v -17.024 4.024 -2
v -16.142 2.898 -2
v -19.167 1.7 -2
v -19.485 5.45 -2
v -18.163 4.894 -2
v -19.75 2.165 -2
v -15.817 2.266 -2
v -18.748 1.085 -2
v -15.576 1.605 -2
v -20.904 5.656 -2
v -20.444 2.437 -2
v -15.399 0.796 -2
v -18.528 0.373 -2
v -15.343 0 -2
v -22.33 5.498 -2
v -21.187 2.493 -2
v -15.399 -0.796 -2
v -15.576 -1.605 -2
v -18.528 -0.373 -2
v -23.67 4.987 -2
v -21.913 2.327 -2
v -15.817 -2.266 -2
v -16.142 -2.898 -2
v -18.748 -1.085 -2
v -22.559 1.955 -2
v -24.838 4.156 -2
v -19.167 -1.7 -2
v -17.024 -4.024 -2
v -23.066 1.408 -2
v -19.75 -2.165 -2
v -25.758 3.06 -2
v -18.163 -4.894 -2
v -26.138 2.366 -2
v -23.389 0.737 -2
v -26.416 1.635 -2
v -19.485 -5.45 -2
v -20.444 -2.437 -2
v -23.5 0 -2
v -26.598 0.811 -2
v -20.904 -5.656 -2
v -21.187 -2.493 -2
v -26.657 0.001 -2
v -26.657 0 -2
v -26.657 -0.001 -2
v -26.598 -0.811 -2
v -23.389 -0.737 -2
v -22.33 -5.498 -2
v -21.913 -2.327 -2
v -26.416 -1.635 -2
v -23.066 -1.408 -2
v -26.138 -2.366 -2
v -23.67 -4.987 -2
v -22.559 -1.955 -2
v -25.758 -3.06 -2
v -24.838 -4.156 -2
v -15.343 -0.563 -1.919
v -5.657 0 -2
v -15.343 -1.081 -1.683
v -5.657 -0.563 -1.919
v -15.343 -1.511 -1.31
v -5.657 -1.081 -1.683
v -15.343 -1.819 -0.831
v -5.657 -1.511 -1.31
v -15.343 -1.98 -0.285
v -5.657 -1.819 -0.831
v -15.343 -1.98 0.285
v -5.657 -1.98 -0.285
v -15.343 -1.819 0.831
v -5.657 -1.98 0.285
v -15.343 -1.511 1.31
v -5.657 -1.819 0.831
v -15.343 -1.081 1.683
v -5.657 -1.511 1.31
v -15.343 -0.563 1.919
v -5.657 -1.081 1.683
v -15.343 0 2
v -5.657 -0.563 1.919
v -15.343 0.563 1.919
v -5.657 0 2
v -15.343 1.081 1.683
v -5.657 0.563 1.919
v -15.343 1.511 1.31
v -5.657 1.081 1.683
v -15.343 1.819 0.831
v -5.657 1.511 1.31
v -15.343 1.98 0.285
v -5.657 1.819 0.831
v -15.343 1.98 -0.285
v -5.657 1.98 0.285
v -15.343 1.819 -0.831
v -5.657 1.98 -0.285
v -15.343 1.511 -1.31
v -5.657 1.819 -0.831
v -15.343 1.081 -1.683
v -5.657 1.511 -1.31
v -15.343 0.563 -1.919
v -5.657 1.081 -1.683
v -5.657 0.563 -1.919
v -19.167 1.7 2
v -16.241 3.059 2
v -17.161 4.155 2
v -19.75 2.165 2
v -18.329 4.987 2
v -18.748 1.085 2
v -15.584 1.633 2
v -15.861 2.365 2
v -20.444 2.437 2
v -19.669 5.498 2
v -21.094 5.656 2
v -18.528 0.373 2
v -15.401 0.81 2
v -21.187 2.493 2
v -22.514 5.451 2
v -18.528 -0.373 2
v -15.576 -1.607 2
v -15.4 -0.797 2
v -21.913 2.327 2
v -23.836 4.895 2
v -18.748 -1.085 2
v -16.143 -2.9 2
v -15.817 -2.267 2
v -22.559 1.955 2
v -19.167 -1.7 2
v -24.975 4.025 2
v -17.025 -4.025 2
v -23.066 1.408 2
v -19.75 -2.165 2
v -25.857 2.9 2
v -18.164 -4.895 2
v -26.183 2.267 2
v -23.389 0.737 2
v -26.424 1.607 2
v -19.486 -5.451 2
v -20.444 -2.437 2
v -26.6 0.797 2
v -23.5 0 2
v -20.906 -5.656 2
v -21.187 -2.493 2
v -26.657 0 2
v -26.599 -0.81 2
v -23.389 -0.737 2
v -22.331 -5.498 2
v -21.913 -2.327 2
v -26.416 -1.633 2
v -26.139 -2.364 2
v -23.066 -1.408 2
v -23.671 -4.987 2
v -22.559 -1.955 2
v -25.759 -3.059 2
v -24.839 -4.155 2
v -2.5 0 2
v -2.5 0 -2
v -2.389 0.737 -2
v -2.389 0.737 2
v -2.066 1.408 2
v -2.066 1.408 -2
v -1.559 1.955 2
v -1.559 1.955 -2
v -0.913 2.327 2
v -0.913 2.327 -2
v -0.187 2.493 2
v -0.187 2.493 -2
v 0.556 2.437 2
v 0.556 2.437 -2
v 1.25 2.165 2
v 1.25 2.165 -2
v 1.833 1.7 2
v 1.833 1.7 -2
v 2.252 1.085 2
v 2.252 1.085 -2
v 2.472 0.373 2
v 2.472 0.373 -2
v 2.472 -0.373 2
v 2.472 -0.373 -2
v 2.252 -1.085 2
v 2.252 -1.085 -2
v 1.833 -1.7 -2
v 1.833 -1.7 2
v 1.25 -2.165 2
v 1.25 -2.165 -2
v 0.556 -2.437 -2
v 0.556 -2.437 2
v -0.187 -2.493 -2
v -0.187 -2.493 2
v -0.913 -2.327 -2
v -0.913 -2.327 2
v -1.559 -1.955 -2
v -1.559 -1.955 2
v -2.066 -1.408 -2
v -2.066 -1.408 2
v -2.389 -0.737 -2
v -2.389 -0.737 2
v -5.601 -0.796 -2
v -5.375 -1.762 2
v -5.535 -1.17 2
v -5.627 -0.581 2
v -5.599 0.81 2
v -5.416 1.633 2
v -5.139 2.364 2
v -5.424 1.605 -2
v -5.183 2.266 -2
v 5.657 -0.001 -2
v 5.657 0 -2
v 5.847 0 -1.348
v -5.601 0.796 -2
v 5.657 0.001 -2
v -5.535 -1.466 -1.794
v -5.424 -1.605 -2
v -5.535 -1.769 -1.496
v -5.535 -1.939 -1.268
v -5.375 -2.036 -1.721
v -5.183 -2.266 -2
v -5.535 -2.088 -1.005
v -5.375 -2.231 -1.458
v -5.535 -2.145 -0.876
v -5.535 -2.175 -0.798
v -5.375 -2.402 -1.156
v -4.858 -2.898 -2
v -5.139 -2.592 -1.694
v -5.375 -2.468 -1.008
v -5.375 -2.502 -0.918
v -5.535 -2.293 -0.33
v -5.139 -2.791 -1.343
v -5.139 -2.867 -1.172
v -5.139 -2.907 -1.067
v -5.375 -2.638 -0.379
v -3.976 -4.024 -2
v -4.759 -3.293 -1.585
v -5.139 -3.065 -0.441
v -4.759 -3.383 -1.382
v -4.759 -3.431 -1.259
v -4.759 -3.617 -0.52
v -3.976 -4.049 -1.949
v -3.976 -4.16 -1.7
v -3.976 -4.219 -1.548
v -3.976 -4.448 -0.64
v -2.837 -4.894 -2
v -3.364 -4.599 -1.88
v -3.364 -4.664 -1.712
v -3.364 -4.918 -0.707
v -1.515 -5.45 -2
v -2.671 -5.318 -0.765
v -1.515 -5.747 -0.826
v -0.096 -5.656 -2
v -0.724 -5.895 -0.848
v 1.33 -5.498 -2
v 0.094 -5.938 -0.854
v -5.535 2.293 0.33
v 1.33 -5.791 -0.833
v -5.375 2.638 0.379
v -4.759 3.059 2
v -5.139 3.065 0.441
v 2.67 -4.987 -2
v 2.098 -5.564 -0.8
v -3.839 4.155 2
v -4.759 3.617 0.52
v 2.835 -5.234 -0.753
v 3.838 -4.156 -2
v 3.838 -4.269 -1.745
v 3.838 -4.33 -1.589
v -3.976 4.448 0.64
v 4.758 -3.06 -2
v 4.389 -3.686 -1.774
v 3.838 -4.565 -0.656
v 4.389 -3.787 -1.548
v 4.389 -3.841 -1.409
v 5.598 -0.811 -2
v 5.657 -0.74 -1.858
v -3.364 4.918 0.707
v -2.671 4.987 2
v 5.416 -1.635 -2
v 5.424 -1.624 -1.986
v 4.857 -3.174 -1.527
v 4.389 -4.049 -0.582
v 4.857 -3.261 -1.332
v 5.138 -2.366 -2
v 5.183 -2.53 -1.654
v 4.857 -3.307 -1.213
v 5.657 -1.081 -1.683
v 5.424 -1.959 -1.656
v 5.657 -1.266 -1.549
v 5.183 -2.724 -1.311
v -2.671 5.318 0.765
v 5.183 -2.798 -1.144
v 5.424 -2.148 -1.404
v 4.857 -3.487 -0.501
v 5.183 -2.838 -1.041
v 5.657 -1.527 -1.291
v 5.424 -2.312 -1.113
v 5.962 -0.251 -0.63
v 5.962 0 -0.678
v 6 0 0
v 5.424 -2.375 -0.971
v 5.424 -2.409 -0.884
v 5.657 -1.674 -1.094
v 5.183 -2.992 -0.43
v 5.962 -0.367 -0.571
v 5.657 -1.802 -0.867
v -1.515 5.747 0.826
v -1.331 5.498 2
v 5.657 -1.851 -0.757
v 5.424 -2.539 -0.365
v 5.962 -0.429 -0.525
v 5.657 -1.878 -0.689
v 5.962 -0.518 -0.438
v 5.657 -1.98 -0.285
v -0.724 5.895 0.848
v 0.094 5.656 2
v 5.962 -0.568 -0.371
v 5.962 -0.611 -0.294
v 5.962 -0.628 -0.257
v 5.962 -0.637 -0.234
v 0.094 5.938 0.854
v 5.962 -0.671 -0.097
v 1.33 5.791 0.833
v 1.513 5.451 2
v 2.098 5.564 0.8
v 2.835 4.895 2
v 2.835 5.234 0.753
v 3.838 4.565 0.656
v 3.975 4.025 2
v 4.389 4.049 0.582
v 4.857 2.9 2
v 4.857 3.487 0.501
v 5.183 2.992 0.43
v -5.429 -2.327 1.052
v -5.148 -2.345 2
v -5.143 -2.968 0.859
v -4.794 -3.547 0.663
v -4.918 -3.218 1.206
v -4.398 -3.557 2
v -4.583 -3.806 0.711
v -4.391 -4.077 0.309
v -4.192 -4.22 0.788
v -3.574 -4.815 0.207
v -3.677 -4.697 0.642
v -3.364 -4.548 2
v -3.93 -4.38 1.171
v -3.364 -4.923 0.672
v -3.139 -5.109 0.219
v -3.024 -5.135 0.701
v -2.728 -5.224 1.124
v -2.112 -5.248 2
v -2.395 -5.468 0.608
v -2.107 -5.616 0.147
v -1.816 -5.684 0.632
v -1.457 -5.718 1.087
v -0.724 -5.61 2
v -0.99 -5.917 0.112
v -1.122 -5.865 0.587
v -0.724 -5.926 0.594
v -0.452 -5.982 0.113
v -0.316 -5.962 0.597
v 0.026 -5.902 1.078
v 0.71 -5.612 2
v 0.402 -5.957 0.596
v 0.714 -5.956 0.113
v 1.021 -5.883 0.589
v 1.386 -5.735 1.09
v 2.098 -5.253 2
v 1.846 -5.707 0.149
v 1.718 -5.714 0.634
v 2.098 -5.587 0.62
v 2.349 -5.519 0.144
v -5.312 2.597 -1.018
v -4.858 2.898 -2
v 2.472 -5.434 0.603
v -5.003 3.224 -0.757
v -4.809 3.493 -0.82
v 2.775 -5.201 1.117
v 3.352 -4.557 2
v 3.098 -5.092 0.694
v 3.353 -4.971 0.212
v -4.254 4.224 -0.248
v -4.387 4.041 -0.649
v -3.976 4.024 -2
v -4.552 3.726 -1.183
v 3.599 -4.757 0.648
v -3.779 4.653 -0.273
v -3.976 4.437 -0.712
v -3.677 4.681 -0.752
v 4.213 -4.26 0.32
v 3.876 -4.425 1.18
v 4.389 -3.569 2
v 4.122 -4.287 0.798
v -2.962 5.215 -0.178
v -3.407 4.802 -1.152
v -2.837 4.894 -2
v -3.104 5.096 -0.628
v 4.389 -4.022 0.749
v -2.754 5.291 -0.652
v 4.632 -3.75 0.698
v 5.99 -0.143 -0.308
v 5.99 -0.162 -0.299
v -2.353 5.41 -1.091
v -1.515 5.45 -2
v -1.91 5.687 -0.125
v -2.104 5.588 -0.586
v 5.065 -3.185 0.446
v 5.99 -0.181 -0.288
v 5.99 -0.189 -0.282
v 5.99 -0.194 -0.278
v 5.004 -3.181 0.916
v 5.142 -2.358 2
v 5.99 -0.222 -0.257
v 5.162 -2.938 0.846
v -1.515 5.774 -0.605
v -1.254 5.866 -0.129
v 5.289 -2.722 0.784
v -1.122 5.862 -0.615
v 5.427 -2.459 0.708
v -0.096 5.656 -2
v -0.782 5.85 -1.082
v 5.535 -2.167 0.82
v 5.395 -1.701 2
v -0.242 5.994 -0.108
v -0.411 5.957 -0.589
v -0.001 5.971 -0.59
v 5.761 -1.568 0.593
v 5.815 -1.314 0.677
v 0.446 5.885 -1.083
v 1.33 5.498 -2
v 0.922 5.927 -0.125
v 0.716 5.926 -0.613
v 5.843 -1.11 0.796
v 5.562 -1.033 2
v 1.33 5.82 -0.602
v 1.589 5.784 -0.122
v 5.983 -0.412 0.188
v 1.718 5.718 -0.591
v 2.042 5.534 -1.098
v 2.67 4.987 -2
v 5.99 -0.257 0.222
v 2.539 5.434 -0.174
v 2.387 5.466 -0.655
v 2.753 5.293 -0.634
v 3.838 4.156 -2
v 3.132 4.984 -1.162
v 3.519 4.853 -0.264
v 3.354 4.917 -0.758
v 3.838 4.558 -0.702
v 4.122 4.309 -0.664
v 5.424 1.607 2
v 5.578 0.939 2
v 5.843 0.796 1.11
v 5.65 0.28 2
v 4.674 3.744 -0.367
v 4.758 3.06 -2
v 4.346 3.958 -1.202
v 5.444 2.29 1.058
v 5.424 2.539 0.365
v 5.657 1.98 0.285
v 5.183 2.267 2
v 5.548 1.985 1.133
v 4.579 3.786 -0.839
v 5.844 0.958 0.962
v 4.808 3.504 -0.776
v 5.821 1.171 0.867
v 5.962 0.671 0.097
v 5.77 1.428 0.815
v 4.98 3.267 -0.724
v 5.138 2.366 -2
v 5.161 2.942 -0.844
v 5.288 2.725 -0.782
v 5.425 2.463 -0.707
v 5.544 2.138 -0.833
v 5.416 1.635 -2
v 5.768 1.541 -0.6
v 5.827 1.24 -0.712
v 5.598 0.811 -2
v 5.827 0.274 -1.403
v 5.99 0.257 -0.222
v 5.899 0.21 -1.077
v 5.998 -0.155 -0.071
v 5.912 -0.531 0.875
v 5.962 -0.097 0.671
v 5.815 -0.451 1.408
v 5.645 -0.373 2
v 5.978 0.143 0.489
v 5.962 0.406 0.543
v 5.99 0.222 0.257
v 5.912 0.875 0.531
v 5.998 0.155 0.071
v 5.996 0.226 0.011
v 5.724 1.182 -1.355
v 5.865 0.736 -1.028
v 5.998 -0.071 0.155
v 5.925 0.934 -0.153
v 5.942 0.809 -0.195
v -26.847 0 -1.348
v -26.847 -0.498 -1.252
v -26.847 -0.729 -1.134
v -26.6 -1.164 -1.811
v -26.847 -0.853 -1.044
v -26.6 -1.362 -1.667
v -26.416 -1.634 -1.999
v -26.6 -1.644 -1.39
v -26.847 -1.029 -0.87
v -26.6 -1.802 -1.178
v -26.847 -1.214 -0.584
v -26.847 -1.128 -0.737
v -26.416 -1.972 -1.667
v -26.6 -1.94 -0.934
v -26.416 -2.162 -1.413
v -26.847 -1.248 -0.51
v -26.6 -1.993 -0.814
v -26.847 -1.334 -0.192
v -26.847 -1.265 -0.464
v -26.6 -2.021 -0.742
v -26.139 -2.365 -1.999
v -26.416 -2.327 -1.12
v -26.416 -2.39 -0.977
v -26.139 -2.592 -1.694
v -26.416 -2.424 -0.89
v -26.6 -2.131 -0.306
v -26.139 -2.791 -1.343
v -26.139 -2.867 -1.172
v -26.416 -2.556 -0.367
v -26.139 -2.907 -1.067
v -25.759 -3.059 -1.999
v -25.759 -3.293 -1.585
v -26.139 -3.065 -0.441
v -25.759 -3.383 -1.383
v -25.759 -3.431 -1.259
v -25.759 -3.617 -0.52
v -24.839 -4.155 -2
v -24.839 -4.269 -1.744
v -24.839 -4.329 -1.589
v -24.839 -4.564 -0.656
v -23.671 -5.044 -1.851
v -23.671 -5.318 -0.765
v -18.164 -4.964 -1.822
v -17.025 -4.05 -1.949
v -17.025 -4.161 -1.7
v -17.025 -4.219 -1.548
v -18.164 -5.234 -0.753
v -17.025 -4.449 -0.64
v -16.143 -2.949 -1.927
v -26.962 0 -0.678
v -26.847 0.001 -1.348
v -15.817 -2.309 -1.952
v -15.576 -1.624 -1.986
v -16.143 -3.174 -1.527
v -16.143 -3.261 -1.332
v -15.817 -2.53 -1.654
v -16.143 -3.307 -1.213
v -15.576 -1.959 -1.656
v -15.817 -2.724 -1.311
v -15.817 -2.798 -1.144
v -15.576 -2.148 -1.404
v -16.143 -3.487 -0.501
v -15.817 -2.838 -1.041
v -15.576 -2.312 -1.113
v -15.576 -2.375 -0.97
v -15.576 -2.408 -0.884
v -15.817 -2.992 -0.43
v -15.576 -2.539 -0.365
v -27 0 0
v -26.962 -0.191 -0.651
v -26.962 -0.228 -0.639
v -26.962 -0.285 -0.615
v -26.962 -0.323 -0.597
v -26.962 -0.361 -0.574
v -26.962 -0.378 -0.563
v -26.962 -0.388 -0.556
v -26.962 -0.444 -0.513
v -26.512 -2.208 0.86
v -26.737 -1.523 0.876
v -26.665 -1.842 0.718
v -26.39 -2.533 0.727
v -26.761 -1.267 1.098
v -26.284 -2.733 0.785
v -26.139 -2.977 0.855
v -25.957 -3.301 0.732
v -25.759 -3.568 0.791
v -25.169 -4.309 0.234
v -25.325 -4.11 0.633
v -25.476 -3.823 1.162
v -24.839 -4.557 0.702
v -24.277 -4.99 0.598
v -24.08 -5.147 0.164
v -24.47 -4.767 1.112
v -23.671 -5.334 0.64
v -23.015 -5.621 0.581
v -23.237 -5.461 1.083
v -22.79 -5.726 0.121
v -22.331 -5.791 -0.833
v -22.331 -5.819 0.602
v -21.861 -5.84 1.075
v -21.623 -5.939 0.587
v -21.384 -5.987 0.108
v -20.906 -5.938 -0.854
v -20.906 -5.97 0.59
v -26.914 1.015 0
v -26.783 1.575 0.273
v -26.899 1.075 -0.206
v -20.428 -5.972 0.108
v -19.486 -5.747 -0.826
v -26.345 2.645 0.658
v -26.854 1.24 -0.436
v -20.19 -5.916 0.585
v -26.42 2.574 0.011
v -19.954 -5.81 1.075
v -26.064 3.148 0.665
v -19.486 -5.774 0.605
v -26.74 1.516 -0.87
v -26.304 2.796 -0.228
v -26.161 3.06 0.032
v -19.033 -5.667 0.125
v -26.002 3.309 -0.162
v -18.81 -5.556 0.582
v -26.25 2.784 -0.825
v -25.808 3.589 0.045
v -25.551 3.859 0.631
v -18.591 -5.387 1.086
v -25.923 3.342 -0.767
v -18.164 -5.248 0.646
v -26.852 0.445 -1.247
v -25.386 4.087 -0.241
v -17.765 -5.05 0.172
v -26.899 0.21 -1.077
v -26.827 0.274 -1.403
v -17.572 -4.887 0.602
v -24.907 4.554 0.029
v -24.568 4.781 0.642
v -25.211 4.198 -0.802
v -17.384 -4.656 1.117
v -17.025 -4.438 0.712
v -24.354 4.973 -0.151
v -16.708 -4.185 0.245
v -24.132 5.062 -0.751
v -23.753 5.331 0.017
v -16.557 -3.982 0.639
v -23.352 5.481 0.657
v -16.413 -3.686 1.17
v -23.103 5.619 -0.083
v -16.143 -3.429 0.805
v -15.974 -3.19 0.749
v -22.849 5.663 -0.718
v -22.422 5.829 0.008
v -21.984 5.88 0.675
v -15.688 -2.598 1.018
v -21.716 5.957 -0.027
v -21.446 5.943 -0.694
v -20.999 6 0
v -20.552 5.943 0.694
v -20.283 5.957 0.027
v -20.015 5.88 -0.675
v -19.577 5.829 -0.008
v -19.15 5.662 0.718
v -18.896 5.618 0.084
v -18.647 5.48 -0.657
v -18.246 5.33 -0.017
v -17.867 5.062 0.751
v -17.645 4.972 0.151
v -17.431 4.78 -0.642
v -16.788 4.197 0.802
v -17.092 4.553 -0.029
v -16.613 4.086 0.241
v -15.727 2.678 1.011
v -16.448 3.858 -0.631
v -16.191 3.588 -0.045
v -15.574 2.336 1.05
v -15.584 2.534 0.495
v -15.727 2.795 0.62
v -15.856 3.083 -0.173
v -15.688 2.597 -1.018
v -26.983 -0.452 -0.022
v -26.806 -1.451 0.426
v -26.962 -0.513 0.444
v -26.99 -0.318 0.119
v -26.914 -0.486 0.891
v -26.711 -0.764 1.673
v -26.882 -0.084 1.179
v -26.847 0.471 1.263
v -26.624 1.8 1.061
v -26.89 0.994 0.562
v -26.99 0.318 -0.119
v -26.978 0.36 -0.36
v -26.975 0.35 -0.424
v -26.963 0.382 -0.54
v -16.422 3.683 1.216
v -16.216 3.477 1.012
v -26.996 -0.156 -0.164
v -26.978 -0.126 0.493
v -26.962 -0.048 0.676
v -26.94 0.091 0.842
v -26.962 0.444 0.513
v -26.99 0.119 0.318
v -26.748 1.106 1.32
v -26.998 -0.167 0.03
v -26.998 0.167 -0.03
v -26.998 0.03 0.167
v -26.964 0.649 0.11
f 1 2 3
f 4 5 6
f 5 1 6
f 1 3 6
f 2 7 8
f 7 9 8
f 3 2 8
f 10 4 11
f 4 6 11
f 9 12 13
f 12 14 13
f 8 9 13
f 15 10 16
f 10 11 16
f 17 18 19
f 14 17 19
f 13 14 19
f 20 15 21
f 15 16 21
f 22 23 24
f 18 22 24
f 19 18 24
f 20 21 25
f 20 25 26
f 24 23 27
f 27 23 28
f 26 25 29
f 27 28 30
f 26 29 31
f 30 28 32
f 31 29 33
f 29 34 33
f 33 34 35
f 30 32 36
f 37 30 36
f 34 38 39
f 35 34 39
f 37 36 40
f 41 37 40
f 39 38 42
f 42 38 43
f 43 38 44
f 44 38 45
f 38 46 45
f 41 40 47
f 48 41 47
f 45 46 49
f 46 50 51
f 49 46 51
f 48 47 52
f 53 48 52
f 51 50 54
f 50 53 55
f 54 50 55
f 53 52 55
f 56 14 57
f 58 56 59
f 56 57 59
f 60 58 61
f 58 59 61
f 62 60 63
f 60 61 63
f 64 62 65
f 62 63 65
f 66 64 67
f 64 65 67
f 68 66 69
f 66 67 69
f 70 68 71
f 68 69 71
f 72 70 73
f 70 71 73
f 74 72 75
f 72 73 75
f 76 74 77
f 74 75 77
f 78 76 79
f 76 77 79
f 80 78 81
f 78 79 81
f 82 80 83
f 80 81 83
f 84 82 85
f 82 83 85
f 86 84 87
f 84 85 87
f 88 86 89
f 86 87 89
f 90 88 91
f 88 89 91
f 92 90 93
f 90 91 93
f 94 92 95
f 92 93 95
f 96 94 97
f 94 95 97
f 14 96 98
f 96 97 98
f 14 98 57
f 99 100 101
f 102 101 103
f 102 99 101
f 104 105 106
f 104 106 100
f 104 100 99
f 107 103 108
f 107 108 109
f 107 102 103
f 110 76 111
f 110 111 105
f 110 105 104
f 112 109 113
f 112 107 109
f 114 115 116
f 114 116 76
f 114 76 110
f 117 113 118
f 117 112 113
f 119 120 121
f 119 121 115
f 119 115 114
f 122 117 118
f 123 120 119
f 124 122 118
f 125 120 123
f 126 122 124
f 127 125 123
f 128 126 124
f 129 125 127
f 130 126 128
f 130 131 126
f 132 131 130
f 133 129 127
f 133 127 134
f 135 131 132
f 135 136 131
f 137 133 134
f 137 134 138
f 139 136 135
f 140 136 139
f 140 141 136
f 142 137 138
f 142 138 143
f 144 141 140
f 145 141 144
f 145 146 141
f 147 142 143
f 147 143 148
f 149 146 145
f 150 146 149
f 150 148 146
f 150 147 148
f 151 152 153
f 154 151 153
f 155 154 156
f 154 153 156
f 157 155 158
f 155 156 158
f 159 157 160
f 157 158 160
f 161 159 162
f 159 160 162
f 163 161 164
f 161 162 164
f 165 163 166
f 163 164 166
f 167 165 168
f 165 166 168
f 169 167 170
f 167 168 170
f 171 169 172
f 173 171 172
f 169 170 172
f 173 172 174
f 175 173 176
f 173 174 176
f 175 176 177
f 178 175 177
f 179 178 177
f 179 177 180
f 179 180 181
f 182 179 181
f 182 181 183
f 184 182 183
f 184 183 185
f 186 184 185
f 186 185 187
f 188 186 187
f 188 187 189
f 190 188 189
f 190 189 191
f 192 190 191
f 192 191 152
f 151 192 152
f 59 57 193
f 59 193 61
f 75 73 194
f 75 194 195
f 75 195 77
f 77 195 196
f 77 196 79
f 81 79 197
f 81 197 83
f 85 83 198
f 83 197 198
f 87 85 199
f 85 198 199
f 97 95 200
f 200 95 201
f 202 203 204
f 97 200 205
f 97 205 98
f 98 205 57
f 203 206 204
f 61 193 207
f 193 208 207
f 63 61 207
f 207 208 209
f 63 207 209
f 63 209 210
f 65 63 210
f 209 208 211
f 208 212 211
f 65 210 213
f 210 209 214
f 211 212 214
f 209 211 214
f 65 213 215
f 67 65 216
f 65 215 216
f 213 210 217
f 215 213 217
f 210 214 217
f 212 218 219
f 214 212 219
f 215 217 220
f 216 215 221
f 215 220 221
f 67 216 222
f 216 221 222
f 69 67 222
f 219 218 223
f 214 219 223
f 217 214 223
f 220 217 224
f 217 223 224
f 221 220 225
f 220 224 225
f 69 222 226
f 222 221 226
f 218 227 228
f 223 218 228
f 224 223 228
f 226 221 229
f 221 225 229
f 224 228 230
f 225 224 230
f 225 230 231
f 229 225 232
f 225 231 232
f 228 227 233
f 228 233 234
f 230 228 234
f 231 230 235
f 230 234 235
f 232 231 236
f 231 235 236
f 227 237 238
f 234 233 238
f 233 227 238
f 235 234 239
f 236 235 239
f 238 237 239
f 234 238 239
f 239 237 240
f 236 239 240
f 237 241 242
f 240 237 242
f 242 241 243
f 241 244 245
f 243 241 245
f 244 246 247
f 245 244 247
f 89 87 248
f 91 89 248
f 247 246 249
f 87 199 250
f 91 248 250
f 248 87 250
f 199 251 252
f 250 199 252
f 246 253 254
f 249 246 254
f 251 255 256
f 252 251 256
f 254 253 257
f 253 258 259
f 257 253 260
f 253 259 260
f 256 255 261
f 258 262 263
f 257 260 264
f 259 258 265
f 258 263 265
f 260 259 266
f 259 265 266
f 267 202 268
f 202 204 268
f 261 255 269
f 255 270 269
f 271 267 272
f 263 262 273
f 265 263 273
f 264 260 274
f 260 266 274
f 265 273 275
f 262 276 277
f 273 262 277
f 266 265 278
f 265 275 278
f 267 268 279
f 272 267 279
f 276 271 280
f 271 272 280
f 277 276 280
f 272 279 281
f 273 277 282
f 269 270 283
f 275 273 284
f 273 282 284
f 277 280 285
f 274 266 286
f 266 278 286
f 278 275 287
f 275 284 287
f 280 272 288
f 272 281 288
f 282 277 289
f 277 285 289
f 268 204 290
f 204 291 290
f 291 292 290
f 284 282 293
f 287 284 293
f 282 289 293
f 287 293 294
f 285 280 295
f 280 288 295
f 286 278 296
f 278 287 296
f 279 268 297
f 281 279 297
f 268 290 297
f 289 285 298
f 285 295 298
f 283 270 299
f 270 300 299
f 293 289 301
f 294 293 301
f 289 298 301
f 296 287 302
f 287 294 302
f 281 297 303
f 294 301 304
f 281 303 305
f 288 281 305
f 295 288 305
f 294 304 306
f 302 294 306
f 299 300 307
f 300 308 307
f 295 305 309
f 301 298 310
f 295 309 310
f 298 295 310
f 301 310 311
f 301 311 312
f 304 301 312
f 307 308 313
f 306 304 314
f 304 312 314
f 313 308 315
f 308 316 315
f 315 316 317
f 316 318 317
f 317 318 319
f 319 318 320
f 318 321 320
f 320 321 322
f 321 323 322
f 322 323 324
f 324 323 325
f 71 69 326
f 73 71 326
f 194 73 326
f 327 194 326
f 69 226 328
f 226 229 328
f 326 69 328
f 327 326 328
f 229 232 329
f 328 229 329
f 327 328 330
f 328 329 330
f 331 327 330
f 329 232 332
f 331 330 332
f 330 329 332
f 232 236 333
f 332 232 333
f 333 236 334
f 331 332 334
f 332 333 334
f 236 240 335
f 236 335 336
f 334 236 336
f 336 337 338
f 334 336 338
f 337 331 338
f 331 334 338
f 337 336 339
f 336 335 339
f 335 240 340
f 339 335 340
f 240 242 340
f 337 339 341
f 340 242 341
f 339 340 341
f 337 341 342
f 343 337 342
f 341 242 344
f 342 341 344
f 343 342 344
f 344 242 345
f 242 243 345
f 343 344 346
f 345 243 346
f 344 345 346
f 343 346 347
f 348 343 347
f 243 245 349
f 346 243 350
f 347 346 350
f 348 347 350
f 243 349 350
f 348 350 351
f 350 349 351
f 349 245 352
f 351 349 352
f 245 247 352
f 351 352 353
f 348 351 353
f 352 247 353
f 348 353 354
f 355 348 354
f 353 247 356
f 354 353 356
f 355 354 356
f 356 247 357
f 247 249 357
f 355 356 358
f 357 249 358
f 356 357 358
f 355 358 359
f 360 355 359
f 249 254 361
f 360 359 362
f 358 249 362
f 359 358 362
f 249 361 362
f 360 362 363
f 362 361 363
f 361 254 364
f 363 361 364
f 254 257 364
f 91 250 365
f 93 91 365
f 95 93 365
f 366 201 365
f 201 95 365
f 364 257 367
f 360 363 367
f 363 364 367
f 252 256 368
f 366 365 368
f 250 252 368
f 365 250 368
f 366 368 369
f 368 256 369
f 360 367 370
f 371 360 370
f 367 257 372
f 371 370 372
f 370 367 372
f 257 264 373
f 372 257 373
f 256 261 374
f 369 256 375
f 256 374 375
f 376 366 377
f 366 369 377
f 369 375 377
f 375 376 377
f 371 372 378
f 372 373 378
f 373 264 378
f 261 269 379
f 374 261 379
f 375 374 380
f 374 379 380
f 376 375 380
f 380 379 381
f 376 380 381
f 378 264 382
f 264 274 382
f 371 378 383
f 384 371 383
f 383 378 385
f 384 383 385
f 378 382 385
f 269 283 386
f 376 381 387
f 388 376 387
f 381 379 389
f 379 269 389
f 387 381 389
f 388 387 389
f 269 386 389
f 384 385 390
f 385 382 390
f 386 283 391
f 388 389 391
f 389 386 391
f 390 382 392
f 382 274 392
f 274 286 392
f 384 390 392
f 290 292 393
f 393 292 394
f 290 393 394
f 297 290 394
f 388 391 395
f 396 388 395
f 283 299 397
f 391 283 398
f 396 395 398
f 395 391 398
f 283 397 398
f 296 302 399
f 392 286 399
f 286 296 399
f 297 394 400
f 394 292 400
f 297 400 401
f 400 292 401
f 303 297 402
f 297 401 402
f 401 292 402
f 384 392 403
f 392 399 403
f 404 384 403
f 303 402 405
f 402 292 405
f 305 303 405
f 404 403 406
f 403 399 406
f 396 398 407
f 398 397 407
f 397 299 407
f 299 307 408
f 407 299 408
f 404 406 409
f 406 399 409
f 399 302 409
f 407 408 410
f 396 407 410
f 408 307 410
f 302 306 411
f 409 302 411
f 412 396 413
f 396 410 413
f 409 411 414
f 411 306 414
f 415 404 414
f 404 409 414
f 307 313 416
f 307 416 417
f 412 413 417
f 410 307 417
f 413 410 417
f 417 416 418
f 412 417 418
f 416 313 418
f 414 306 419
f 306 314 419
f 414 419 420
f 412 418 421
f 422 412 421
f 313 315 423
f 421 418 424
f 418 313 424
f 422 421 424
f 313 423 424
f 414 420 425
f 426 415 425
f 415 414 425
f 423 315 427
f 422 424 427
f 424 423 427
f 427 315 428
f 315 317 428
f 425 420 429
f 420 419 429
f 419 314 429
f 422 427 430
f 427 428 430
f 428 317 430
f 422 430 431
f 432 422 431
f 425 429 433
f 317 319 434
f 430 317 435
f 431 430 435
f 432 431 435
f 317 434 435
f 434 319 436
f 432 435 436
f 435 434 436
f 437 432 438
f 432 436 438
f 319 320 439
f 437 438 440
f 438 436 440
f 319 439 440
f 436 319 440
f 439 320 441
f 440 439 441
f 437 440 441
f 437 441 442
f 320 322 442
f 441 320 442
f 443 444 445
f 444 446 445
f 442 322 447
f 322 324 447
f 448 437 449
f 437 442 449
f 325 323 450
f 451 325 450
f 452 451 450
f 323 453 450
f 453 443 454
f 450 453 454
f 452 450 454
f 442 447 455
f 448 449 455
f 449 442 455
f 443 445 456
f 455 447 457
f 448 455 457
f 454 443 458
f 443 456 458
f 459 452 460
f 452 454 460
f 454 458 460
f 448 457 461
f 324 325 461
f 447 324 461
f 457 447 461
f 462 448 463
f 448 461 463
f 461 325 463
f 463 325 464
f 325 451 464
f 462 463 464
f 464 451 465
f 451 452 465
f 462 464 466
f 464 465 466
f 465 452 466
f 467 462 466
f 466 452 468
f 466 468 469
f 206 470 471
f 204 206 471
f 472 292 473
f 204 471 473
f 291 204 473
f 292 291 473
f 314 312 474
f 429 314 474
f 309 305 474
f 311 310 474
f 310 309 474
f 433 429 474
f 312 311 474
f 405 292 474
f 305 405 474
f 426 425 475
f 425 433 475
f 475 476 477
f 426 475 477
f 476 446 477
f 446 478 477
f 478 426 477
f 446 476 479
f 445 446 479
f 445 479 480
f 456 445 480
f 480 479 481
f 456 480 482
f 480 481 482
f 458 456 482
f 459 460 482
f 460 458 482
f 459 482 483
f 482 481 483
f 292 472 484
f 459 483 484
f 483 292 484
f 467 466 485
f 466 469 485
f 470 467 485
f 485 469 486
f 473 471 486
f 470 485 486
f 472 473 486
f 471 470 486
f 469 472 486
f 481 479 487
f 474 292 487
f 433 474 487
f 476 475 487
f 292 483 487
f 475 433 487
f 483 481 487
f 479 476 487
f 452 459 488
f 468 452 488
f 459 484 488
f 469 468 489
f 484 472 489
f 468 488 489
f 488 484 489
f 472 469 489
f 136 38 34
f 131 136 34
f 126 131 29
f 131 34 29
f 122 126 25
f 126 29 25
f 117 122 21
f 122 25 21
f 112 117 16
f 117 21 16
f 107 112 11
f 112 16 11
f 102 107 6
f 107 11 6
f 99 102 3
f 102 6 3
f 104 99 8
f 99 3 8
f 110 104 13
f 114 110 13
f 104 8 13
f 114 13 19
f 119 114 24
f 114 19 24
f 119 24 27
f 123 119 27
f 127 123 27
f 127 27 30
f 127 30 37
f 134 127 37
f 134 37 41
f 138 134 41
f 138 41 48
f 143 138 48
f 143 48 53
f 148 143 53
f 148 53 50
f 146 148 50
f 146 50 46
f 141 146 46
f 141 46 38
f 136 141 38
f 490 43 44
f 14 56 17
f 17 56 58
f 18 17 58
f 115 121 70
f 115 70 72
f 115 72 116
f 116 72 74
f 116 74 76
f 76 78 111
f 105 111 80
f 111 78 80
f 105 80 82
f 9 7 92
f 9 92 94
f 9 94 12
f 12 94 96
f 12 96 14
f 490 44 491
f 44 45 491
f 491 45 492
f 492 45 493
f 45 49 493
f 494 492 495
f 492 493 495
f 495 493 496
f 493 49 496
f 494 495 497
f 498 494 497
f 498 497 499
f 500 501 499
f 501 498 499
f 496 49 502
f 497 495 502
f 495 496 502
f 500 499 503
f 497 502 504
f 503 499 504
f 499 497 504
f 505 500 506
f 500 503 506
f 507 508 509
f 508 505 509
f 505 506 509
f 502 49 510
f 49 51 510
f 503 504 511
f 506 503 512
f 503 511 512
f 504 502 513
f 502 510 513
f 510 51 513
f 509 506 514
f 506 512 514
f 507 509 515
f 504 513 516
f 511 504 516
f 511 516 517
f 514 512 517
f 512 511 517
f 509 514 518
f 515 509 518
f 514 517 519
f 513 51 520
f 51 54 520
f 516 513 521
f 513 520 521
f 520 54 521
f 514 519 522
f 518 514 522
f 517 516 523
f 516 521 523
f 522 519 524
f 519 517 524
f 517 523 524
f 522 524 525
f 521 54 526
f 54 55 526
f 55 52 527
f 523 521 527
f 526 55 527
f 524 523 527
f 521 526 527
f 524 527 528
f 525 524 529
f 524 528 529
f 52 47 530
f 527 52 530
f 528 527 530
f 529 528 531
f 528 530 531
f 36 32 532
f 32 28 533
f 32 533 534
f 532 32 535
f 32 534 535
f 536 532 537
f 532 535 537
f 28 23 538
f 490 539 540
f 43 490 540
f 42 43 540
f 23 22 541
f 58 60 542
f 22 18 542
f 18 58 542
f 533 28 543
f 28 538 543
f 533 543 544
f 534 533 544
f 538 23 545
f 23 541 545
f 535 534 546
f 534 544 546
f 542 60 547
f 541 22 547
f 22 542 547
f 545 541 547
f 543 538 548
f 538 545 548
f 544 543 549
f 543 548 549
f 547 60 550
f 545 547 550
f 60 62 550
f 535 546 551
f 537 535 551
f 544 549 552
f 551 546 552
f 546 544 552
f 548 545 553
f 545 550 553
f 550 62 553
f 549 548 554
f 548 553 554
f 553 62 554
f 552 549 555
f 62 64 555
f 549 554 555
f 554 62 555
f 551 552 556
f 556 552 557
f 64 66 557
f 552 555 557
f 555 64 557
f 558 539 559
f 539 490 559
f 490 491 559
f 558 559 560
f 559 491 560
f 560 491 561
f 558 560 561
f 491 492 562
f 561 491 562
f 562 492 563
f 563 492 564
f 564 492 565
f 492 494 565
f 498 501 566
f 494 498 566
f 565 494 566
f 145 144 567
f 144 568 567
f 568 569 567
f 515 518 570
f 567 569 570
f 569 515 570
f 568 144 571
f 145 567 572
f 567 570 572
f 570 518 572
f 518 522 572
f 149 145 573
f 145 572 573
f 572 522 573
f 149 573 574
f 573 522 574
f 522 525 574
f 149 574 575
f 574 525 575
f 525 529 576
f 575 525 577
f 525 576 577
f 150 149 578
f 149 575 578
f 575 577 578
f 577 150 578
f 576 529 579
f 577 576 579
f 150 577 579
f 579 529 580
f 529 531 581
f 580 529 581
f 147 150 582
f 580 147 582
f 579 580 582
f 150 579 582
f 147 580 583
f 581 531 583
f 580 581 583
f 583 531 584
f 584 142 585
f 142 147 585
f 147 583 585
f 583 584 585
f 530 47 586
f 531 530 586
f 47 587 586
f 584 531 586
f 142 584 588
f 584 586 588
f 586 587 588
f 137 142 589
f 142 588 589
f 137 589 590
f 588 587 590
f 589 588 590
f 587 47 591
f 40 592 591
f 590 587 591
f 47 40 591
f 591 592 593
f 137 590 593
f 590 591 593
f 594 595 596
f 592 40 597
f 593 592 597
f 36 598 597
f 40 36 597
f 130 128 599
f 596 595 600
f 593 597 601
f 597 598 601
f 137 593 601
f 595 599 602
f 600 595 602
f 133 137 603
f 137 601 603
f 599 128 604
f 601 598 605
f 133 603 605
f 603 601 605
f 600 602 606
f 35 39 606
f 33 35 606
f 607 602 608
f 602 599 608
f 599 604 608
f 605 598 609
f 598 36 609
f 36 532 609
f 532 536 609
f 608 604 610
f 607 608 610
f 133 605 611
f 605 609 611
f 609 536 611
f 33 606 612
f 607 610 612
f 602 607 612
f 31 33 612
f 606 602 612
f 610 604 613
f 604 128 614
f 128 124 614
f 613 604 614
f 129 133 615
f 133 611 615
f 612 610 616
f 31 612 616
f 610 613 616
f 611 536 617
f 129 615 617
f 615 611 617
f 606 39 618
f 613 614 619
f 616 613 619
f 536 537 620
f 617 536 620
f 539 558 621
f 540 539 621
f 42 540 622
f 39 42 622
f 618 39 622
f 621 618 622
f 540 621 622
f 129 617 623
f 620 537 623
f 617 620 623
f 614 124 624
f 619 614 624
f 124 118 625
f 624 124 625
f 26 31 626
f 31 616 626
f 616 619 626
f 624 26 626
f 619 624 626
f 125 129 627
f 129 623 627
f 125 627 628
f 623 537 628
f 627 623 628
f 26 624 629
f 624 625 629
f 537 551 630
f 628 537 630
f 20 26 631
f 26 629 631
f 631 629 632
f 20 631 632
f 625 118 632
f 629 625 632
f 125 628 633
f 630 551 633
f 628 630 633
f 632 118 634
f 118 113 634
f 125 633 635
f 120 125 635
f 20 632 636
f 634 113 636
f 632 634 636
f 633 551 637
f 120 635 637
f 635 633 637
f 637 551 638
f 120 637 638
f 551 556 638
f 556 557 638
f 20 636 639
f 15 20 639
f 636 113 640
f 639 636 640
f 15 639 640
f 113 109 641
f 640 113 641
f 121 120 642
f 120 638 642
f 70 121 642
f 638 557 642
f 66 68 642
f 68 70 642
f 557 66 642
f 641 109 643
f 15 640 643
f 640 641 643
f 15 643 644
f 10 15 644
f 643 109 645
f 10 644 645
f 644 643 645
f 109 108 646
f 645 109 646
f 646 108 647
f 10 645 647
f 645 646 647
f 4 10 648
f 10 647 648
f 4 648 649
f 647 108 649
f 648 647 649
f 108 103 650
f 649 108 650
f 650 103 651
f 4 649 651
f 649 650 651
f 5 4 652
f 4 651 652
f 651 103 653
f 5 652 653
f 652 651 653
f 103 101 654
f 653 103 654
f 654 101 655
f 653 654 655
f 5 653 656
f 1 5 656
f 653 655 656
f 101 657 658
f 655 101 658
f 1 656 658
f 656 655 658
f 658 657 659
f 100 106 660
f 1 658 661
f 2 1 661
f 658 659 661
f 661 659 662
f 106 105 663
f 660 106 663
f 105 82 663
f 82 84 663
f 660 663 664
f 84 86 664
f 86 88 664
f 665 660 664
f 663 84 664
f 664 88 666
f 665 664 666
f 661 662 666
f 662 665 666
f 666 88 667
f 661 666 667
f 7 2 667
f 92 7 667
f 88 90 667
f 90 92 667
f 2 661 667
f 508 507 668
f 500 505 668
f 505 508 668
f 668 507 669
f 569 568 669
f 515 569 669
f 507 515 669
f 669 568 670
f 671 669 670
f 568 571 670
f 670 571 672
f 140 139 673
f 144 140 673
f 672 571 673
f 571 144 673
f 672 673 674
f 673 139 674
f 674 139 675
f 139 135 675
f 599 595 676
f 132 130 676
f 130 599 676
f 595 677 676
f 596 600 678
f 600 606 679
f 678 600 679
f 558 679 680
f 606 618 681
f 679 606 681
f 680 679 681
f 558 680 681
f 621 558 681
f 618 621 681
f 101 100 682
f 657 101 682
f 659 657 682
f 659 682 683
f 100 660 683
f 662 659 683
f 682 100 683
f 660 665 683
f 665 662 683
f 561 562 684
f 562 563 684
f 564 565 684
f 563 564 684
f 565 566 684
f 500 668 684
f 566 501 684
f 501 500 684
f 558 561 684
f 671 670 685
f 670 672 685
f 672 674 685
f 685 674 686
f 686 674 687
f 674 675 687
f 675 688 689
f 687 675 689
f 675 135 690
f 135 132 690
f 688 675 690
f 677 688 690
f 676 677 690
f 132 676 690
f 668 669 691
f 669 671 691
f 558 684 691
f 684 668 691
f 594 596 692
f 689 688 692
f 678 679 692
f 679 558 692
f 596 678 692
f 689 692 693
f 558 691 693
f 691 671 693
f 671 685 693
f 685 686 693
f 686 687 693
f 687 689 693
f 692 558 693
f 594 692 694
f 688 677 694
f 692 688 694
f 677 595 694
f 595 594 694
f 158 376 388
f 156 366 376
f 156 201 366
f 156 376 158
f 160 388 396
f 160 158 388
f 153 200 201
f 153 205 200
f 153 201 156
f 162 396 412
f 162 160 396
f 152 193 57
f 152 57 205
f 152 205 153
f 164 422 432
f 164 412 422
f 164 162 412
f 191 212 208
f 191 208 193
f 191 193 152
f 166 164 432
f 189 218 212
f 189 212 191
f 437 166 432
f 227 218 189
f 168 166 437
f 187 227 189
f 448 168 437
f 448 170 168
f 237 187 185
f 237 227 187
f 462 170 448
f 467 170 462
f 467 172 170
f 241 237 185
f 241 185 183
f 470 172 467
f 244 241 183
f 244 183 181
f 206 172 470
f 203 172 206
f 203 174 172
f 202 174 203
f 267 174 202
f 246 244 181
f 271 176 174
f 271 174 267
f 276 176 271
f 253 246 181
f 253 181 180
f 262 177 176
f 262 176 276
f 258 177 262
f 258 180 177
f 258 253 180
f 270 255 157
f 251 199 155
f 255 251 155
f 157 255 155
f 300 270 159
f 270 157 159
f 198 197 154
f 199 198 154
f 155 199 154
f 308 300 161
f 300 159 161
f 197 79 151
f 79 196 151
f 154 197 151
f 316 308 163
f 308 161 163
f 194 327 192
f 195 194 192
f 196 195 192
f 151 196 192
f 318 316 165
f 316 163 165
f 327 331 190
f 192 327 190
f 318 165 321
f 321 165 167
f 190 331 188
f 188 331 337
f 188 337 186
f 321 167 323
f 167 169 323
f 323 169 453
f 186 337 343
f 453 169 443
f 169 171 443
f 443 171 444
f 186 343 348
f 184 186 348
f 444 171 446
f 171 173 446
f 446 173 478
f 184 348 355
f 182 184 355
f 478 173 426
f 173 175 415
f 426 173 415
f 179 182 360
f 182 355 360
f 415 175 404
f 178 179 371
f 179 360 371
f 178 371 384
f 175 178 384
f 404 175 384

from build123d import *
from build123d.topology import SkipClean

# Parameters (mm, degrees)
CUT_EXTRUDE4_DEPTH       = 29.301943396
CUT_EXTRUDE4_DEPTH_BACK  = 29.301943396
CUT_EXTRUDE5_REACH       = 30.792
SKETCH5_R                = 2.5
CUT_EXTRUDE10_DEPTH      = 10
CUT_EXTRUDE10_DEPTH_BACK = 10
SKETCH9_R                = 2.5
CUT_EXTRUDE11_DEPTH      = 10


with BuildPart() as part:
    # Sketch1 → Revolve1 (revolve)
    with BuildSketch(Plane.XY):
        with BuildLine():
            Line((6, 0), (-27, 0))
            ThreePointArc((-27, 0), (-22.014611872, 5.913591358), (-15.343145751, 2))
            Line((-15.343145751, 2), (-5.656854249, 2))
            ThreePointArc((-5.656854249, 2), (1.014611872, 5.913591358), (6, 0))
        make_face()
    revolve(axis=Axis((6.214656997, 0, 0), (-1, 0, 0)))

    # Sketch4 → Cut-Extrude4 (cut, two sides: drawn at the far end of the back side and taken through both)
    with SkipClean():  # the faces are left unmerged after this step: merging them gives an invalid solid
        with BuildSketch(Plane(origin=(0, 0, 0), x_dir=(1, 0, 0), z_dir=(0, 1, 0)).offset(-CUT_EXTRUDE4_DEPTH_BACK)):
            with BuildLine():
                Line((-5.656854249, 2), (5.656854249, 2))
                ThreePointArc((5.656854249, 2), (0, 6), (-5.656854249, 2))
            make_face()
            with BuildLine():
                Line((-5.656854249, -2), (5.656854249, -2))
                ThreePointArc((5.656854249, -2), (0, -6), (-5.656854249, -2))
            make_face()
        extrude(amount=CUT_EXTRUDE4_DEPTH + CUT_EXTRUDE4_DEPTH_BACK, mode=Mode.SUBTRACT)

    # Sketch5 → Cut-Extrude5 (cut, up to next)
    with BuildSketch(Plane(origin=(0, 0, -2), x_dir=(-1, 0, 0), z_dir=(0, 0, -1)), mode=Mode.PRIVATE) as cut_extrude5_sk1:
        Circle(SKETCH5_R)
    cut_extrude5_tool1 = extrude(cut_extrude5_sk1.sketch, amount=-CUT_EXTRUDE5_REACH, mode=Mode.PRIVATE) & part.part
    add(cut_extrude5_tool1.solids().sort_by_distance((0, 0, -2))[0], mode=Mode.SUBTRACT)

    # Sketch8 → Cut-Extrude10 (cut, two sides: drawn at the far end of the back side and taken through both)
    with SkipClean():  # the faces are left unmerged after this step: merging them gives an invalid solid
        with BuildSketch(Plane(origin=(0, 0, 0), x_dir=(1, 0, 0), z_dir=(0, 1, 0)).offset(-CUT_EXTRUDE10_DEPTH_BACK)):
            with BuildLine():
                Line((-15.343145751, 2), (-26.656854249, 2))
                ThreePointArc((-26.656854249, 2), (-21, 6), (-15.343145751, 2))
            make_face()
            with BuildLine():
                Line((-15.343145751, -2), (-26.656854249, -2))
                ThreePointArc((-26.656854249, -2), (-21, -6), (-15.343145751, -2))
            make_face()
        extrude(amount=CUT_EXTRUDE10_DEPTH + CUT_EXTRUDE10_DEPTH_BACK, mode=Mode.SUBTRACT)

    # Sketch9 → Cut-Extrude11 (cut)
    with SkipClean():  # the faces are left unmerged after this step: merging them gives an invalid solid
        with BuildSketch(Plane(origin=(0, 0, -2), x_dir=(-1, 0, 0), z_dir=(0, 0, -1))):
            with Locations((21, 0)):
                Circle(SKETCH9_R)
        extrude(amount=-CUT_EXTRUDE11_DEPTH, mode=Mode.SUBTRACT)


solid = part.part
